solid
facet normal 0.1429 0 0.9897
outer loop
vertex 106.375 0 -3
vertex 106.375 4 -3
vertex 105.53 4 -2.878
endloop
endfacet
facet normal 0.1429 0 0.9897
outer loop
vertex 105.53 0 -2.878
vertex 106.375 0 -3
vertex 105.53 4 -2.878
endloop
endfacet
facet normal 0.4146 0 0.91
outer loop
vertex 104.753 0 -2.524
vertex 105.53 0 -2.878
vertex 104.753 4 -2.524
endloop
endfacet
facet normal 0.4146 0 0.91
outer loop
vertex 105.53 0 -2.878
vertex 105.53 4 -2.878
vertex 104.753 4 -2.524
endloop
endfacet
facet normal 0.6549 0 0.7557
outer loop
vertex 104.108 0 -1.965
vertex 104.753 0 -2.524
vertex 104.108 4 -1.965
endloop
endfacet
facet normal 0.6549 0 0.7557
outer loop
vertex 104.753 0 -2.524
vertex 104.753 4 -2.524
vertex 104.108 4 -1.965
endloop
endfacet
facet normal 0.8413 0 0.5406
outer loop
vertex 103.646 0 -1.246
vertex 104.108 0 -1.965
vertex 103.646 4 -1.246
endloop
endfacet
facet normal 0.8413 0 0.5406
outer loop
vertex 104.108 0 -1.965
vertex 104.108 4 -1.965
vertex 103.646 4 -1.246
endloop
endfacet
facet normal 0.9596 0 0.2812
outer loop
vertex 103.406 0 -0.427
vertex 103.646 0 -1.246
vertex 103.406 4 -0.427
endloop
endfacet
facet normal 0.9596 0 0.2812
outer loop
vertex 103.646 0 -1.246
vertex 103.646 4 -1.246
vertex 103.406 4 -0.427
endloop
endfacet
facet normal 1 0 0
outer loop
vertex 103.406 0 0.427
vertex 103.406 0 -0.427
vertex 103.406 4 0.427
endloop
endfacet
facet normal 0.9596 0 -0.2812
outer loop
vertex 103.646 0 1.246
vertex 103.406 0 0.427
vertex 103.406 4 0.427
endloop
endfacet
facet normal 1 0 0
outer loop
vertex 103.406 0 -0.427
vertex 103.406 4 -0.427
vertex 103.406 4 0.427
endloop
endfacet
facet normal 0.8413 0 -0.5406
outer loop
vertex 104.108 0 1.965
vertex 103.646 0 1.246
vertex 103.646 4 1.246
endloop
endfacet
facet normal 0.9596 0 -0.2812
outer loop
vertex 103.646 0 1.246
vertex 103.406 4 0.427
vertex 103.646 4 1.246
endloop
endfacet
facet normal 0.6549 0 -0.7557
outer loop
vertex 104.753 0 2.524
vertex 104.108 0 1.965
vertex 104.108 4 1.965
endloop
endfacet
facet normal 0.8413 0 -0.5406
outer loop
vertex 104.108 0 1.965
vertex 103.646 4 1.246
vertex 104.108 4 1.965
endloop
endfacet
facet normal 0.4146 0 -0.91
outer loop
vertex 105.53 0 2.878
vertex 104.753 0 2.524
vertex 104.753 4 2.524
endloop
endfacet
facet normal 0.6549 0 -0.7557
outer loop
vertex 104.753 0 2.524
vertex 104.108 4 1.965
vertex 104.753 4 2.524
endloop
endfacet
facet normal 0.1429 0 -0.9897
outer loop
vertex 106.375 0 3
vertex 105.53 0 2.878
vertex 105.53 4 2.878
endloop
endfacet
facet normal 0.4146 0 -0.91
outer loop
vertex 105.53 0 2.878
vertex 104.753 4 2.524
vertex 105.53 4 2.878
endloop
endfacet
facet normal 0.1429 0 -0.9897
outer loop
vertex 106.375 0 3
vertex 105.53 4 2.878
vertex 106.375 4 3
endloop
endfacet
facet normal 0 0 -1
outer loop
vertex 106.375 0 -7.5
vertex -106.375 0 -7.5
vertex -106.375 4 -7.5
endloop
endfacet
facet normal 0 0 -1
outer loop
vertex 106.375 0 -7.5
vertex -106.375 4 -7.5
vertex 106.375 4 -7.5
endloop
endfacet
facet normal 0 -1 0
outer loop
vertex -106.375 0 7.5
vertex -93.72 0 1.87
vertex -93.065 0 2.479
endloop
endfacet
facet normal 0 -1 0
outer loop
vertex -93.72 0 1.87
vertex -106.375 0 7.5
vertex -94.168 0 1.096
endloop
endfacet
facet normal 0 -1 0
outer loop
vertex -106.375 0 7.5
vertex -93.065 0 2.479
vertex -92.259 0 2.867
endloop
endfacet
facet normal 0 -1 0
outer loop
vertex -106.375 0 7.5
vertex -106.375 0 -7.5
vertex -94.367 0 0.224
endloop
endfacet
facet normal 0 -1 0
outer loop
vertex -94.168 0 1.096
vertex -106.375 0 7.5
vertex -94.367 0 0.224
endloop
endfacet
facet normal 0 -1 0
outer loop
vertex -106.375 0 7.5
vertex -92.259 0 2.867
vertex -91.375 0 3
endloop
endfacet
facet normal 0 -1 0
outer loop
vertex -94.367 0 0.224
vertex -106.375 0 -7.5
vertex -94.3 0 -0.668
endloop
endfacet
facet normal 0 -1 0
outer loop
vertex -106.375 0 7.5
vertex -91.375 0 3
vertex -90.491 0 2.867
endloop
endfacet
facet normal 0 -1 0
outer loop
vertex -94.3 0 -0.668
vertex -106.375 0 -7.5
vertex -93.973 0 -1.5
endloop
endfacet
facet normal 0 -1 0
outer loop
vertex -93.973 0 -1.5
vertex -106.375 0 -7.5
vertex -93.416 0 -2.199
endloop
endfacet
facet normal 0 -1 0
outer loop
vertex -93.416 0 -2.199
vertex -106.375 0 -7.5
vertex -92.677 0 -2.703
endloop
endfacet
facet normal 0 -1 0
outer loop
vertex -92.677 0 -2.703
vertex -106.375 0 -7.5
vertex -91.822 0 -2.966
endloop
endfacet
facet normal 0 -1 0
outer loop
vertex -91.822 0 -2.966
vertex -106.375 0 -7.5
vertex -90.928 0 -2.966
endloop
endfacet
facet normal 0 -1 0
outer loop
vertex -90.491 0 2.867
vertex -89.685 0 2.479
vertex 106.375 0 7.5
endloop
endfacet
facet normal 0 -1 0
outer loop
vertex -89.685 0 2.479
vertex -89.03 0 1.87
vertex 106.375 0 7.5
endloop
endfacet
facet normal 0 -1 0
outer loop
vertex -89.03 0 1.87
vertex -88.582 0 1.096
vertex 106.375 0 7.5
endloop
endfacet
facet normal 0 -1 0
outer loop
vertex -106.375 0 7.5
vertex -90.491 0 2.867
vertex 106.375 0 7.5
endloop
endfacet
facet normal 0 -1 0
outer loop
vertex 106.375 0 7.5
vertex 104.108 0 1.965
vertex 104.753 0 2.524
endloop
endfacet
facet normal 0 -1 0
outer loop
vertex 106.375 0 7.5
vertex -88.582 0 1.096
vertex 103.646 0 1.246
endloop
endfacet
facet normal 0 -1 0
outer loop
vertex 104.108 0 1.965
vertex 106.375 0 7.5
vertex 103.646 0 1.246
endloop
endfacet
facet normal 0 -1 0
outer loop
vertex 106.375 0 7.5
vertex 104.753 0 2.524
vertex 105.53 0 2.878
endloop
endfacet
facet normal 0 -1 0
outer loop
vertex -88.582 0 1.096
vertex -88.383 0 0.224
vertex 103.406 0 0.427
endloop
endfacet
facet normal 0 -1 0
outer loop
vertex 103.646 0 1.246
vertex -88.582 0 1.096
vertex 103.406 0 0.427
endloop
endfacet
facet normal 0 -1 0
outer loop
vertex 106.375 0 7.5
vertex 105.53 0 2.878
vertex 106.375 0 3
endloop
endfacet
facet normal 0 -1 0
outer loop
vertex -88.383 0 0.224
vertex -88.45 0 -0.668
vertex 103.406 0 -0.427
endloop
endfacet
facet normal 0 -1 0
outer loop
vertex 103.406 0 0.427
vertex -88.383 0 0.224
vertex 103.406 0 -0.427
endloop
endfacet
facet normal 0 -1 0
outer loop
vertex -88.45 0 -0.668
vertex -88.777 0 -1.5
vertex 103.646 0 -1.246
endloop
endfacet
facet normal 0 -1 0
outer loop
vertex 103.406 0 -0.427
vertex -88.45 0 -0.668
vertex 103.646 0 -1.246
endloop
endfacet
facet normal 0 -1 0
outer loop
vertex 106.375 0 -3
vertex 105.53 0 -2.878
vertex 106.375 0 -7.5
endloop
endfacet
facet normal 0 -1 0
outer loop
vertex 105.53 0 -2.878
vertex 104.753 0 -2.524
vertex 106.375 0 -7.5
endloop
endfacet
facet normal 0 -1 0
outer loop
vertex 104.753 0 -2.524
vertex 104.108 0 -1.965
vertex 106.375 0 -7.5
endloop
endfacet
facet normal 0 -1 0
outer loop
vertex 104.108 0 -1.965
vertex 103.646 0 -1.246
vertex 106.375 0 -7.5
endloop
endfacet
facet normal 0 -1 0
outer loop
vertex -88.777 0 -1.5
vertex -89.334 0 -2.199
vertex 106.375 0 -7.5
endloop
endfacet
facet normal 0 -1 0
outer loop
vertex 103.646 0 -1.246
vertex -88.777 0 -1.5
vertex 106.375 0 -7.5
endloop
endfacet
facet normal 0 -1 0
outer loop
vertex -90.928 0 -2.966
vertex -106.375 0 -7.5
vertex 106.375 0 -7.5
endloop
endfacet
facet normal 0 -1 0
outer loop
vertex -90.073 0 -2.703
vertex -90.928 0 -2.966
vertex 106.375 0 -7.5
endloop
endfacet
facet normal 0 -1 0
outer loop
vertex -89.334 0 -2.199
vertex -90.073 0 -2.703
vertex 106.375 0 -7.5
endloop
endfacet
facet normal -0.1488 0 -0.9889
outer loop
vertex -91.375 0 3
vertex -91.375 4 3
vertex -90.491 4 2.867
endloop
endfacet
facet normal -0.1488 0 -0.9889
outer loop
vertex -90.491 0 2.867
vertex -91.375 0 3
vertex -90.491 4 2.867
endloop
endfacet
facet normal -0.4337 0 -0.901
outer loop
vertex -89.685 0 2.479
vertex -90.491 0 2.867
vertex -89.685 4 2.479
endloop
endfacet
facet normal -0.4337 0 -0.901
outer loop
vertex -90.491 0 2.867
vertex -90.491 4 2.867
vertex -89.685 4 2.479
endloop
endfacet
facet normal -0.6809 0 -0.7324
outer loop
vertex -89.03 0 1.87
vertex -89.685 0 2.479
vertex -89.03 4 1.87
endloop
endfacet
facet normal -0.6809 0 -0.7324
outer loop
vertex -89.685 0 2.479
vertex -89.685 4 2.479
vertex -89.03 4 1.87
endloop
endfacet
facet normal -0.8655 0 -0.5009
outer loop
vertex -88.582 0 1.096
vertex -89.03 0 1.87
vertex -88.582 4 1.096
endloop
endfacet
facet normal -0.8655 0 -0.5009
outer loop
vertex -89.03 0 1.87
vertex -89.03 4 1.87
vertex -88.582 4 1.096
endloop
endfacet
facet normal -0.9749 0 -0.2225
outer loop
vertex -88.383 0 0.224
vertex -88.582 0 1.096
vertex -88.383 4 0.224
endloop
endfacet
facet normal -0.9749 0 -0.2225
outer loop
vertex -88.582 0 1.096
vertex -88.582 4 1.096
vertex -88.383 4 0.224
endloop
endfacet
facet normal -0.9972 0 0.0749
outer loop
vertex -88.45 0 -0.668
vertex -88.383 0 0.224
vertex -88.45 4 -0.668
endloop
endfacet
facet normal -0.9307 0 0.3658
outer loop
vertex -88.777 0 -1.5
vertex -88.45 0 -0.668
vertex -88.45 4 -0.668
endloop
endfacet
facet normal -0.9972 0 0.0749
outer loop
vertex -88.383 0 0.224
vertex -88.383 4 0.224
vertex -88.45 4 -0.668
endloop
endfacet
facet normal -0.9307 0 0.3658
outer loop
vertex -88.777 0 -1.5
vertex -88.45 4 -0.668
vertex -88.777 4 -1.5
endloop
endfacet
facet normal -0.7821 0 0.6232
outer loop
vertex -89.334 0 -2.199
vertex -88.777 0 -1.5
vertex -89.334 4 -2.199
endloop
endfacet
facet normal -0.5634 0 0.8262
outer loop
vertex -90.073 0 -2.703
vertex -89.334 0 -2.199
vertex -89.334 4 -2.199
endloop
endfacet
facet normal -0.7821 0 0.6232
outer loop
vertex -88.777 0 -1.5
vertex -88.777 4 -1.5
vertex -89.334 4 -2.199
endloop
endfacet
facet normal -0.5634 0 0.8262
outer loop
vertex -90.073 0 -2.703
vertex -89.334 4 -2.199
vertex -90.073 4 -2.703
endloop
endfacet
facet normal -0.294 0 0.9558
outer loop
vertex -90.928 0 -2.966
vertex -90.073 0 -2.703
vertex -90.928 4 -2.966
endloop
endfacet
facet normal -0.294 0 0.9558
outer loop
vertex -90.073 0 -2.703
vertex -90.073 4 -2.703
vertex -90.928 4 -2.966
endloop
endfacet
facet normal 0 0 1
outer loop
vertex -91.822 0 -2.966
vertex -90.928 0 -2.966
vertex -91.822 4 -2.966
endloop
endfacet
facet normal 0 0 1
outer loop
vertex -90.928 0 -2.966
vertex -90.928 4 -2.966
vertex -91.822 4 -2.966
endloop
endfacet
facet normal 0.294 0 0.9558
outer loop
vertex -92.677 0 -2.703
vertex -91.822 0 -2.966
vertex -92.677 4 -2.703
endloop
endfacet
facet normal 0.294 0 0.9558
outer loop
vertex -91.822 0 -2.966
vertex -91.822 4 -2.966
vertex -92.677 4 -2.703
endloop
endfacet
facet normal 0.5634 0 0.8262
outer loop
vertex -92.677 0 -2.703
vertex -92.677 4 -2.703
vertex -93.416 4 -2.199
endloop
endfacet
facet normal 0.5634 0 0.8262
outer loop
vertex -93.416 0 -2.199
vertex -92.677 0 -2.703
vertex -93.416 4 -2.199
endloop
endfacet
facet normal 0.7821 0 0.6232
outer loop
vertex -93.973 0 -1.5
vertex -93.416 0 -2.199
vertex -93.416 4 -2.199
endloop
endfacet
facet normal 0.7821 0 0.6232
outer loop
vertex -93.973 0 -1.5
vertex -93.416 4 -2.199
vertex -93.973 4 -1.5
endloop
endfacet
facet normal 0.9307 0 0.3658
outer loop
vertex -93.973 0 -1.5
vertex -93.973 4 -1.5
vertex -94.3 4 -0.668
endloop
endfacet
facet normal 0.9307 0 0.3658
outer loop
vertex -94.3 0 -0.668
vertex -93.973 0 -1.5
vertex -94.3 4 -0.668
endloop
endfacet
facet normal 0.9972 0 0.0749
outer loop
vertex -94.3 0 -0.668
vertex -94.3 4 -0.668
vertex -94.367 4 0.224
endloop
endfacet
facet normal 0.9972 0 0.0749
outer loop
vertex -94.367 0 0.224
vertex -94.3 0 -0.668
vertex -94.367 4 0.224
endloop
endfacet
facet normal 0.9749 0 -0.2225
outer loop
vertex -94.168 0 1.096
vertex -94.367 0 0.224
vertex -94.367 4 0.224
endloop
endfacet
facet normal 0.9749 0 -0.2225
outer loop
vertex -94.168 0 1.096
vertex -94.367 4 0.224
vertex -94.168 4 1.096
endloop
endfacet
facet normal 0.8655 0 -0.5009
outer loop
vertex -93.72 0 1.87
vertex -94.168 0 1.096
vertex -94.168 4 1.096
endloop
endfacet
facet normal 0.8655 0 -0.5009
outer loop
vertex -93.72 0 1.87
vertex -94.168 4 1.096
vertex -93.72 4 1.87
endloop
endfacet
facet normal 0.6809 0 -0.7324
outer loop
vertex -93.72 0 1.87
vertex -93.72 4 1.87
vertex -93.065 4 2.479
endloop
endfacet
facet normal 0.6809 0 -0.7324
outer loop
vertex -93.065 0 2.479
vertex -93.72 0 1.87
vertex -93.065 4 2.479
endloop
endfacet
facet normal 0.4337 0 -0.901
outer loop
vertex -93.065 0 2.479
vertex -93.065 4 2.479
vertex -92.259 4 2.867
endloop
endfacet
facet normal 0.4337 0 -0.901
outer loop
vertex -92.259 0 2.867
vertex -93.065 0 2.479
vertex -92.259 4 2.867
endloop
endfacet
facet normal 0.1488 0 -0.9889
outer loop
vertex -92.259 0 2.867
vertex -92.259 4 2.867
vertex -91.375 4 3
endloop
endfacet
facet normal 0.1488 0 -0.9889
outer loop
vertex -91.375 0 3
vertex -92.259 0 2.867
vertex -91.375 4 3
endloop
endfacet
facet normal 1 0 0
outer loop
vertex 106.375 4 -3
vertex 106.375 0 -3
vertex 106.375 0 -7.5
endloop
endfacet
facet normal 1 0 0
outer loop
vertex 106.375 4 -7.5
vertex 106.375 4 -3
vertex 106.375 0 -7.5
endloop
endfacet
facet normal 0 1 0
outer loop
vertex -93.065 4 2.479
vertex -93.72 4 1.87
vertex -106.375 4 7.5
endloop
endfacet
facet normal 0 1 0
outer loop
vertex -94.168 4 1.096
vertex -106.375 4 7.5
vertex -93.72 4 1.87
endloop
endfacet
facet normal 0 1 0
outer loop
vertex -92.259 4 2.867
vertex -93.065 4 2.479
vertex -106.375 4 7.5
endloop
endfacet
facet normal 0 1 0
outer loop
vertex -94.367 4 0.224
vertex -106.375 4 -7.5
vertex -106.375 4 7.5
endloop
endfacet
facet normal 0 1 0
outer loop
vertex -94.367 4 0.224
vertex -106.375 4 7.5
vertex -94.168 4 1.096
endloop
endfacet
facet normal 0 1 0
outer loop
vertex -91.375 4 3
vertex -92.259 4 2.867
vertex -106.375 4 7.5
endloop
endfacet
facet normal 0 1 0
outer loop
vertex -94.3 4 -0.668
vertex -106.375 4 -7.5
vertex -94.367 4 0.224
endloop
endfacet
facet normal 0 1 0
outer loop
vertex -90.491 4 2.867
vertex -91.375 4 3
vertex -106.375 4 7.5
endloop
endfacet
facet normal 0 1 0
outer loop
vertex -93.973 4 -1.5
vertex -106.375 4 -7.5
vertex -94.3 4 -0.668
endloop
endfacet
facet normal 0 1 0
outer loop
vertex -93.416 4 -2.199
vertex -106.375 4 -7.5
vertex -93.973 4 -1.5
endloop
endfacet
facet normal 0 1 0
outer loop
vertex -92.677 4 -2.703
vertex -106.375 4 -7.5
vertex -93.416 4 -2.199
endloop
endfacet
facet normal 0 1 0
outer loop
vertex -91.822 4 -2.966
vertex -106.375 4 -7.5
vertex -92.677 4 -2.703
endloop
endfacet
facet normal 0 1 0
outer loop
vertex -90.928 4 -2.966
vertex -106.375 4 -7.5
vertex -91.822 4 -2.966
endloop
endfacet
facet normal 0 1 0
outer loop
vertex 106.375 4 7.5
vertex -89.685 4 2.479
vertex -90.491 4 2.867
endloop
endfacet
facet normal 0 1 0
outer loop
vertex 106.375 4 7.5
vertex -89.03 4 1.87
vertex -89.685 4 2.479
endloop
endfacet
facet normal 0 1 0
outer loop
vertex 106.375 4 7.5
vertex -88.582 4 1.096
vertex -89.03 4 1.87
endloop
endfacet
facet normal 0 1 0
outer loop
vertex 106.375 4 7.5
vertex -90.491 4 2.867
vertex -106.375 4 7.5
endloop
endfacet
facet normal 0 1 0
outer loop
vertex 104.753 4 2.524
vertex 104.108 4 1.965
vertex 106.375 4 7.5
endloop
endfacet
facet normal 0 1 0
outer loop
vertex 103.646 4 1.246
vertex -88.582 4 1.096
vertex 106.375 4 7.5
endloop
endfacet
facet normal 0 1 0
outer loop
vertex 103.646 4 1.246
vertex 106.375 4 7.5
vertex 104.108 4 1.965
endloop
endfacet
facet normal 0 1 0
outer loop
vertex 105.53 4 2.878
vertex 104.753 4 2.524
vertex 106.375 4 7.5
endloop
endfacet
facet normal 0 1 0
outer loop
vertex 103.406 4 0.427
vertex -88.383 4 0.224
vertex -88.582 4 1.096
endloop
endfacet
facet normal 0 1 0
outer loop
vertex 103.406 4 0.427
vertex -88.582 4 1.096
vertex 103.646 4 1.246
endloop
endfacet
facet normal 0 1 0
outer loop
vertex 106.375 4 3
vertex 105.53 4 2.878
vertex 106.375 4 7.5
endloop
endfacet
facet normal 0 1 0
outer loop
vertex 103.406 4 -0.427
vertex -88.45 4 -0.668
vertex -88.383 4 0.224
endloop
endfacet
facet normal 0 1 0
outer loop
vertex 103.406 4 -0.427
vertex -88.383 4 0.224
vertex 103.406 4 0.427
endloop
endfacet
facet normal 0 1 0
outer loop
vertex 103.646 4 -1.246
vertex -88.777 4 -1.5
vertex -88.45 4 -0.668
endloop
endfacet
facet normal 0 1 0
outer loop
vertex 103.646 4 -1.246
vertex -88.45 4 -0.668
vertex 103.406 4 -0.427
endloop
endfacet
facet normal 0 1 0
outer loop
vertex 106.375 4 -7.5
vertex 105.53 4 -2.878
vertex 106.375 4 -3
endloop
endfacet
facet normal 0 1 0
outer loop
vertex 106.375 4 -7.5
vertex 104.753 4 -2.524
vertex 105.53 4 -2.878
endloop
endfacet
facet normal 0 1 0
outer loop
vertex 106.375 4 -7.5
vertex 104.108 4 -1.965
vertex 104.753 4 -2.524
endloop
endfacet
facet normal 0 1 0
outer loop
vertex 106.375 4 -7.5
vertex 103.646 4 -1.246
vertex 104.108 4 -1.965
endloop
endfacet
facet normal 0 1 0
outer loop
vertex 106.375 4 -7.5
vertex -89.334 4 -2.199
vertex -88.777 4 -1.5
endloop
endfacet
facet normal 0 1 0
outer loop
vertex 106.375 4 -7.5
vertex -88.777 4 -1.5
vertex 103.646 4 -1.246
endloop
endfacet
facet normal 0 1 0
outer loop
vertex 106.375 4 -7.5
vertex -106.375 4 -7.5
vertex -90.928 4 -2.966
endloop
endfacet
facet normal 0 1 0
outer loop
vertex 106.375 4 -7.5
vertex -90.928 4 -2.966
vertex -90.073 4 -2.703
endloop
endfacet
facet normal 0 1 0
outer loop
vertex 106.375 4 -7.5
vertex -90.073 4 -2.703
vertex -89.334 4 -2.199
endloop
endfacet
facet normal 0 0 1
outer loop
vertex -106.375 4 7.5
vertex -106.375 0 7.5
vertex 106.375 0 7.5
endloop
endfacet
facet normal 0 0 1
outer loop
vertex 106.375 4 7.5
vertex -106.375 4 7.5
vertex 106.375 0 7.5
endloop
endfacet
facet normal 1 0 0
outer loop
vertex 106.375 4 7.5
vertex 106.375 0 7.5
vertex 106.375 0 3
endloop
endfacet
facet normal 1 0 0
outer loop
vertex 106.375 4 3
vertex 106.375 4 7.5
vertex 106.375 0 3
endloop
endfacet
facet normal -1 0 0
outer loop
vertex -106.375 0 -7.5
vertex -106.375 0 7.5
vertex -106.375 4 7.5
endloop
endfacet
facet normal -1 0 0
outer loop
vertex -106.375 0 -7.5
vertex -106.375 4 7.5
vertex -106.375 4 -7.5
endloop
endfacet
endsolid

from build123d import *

# Parameters (mm, degrees)
SKETCH1_W           = 212.750000014
SKETCH1_H           = 15
BOSS_EXTRUDE1_DEPTH = 4
SKETCH2_R           = 3
CUT_EXTRUDE1_DEPTH  = 107.714060116


with BuildPart() as part:
    # Sketch1 → Boss-Extrude1 (new body)
    with BuildSketch(Plane(origin=(0, 0, 0), x_dir=(1, 0, 0), z_dir=(0, 1, 0))):
        Rectangle(SKETCH1_W, SKETCH1_H)
    extrude(amount=BOSS_EXTRUDE1_DEPTH)

    # Sketch2 → Cut-Extrude1 (cut, through all)
    with BuildSketch(Plane(origin=(0, 4, 0), x_dir=(1, 0, 0), z_dir=(0, 1, 0))):
        with Locations(Location((-91.375000007, 0, 0), (0, 0, 270))):
            Circle(SKETCH2_R)
        with Locations((106.375000007, 0)):
            Circle(SKETCH2_R)
    extrude(amount=-CUT_EXTRUDE1_DEPTH, mode=Mode.SUBTRACT)


solid = part.part
